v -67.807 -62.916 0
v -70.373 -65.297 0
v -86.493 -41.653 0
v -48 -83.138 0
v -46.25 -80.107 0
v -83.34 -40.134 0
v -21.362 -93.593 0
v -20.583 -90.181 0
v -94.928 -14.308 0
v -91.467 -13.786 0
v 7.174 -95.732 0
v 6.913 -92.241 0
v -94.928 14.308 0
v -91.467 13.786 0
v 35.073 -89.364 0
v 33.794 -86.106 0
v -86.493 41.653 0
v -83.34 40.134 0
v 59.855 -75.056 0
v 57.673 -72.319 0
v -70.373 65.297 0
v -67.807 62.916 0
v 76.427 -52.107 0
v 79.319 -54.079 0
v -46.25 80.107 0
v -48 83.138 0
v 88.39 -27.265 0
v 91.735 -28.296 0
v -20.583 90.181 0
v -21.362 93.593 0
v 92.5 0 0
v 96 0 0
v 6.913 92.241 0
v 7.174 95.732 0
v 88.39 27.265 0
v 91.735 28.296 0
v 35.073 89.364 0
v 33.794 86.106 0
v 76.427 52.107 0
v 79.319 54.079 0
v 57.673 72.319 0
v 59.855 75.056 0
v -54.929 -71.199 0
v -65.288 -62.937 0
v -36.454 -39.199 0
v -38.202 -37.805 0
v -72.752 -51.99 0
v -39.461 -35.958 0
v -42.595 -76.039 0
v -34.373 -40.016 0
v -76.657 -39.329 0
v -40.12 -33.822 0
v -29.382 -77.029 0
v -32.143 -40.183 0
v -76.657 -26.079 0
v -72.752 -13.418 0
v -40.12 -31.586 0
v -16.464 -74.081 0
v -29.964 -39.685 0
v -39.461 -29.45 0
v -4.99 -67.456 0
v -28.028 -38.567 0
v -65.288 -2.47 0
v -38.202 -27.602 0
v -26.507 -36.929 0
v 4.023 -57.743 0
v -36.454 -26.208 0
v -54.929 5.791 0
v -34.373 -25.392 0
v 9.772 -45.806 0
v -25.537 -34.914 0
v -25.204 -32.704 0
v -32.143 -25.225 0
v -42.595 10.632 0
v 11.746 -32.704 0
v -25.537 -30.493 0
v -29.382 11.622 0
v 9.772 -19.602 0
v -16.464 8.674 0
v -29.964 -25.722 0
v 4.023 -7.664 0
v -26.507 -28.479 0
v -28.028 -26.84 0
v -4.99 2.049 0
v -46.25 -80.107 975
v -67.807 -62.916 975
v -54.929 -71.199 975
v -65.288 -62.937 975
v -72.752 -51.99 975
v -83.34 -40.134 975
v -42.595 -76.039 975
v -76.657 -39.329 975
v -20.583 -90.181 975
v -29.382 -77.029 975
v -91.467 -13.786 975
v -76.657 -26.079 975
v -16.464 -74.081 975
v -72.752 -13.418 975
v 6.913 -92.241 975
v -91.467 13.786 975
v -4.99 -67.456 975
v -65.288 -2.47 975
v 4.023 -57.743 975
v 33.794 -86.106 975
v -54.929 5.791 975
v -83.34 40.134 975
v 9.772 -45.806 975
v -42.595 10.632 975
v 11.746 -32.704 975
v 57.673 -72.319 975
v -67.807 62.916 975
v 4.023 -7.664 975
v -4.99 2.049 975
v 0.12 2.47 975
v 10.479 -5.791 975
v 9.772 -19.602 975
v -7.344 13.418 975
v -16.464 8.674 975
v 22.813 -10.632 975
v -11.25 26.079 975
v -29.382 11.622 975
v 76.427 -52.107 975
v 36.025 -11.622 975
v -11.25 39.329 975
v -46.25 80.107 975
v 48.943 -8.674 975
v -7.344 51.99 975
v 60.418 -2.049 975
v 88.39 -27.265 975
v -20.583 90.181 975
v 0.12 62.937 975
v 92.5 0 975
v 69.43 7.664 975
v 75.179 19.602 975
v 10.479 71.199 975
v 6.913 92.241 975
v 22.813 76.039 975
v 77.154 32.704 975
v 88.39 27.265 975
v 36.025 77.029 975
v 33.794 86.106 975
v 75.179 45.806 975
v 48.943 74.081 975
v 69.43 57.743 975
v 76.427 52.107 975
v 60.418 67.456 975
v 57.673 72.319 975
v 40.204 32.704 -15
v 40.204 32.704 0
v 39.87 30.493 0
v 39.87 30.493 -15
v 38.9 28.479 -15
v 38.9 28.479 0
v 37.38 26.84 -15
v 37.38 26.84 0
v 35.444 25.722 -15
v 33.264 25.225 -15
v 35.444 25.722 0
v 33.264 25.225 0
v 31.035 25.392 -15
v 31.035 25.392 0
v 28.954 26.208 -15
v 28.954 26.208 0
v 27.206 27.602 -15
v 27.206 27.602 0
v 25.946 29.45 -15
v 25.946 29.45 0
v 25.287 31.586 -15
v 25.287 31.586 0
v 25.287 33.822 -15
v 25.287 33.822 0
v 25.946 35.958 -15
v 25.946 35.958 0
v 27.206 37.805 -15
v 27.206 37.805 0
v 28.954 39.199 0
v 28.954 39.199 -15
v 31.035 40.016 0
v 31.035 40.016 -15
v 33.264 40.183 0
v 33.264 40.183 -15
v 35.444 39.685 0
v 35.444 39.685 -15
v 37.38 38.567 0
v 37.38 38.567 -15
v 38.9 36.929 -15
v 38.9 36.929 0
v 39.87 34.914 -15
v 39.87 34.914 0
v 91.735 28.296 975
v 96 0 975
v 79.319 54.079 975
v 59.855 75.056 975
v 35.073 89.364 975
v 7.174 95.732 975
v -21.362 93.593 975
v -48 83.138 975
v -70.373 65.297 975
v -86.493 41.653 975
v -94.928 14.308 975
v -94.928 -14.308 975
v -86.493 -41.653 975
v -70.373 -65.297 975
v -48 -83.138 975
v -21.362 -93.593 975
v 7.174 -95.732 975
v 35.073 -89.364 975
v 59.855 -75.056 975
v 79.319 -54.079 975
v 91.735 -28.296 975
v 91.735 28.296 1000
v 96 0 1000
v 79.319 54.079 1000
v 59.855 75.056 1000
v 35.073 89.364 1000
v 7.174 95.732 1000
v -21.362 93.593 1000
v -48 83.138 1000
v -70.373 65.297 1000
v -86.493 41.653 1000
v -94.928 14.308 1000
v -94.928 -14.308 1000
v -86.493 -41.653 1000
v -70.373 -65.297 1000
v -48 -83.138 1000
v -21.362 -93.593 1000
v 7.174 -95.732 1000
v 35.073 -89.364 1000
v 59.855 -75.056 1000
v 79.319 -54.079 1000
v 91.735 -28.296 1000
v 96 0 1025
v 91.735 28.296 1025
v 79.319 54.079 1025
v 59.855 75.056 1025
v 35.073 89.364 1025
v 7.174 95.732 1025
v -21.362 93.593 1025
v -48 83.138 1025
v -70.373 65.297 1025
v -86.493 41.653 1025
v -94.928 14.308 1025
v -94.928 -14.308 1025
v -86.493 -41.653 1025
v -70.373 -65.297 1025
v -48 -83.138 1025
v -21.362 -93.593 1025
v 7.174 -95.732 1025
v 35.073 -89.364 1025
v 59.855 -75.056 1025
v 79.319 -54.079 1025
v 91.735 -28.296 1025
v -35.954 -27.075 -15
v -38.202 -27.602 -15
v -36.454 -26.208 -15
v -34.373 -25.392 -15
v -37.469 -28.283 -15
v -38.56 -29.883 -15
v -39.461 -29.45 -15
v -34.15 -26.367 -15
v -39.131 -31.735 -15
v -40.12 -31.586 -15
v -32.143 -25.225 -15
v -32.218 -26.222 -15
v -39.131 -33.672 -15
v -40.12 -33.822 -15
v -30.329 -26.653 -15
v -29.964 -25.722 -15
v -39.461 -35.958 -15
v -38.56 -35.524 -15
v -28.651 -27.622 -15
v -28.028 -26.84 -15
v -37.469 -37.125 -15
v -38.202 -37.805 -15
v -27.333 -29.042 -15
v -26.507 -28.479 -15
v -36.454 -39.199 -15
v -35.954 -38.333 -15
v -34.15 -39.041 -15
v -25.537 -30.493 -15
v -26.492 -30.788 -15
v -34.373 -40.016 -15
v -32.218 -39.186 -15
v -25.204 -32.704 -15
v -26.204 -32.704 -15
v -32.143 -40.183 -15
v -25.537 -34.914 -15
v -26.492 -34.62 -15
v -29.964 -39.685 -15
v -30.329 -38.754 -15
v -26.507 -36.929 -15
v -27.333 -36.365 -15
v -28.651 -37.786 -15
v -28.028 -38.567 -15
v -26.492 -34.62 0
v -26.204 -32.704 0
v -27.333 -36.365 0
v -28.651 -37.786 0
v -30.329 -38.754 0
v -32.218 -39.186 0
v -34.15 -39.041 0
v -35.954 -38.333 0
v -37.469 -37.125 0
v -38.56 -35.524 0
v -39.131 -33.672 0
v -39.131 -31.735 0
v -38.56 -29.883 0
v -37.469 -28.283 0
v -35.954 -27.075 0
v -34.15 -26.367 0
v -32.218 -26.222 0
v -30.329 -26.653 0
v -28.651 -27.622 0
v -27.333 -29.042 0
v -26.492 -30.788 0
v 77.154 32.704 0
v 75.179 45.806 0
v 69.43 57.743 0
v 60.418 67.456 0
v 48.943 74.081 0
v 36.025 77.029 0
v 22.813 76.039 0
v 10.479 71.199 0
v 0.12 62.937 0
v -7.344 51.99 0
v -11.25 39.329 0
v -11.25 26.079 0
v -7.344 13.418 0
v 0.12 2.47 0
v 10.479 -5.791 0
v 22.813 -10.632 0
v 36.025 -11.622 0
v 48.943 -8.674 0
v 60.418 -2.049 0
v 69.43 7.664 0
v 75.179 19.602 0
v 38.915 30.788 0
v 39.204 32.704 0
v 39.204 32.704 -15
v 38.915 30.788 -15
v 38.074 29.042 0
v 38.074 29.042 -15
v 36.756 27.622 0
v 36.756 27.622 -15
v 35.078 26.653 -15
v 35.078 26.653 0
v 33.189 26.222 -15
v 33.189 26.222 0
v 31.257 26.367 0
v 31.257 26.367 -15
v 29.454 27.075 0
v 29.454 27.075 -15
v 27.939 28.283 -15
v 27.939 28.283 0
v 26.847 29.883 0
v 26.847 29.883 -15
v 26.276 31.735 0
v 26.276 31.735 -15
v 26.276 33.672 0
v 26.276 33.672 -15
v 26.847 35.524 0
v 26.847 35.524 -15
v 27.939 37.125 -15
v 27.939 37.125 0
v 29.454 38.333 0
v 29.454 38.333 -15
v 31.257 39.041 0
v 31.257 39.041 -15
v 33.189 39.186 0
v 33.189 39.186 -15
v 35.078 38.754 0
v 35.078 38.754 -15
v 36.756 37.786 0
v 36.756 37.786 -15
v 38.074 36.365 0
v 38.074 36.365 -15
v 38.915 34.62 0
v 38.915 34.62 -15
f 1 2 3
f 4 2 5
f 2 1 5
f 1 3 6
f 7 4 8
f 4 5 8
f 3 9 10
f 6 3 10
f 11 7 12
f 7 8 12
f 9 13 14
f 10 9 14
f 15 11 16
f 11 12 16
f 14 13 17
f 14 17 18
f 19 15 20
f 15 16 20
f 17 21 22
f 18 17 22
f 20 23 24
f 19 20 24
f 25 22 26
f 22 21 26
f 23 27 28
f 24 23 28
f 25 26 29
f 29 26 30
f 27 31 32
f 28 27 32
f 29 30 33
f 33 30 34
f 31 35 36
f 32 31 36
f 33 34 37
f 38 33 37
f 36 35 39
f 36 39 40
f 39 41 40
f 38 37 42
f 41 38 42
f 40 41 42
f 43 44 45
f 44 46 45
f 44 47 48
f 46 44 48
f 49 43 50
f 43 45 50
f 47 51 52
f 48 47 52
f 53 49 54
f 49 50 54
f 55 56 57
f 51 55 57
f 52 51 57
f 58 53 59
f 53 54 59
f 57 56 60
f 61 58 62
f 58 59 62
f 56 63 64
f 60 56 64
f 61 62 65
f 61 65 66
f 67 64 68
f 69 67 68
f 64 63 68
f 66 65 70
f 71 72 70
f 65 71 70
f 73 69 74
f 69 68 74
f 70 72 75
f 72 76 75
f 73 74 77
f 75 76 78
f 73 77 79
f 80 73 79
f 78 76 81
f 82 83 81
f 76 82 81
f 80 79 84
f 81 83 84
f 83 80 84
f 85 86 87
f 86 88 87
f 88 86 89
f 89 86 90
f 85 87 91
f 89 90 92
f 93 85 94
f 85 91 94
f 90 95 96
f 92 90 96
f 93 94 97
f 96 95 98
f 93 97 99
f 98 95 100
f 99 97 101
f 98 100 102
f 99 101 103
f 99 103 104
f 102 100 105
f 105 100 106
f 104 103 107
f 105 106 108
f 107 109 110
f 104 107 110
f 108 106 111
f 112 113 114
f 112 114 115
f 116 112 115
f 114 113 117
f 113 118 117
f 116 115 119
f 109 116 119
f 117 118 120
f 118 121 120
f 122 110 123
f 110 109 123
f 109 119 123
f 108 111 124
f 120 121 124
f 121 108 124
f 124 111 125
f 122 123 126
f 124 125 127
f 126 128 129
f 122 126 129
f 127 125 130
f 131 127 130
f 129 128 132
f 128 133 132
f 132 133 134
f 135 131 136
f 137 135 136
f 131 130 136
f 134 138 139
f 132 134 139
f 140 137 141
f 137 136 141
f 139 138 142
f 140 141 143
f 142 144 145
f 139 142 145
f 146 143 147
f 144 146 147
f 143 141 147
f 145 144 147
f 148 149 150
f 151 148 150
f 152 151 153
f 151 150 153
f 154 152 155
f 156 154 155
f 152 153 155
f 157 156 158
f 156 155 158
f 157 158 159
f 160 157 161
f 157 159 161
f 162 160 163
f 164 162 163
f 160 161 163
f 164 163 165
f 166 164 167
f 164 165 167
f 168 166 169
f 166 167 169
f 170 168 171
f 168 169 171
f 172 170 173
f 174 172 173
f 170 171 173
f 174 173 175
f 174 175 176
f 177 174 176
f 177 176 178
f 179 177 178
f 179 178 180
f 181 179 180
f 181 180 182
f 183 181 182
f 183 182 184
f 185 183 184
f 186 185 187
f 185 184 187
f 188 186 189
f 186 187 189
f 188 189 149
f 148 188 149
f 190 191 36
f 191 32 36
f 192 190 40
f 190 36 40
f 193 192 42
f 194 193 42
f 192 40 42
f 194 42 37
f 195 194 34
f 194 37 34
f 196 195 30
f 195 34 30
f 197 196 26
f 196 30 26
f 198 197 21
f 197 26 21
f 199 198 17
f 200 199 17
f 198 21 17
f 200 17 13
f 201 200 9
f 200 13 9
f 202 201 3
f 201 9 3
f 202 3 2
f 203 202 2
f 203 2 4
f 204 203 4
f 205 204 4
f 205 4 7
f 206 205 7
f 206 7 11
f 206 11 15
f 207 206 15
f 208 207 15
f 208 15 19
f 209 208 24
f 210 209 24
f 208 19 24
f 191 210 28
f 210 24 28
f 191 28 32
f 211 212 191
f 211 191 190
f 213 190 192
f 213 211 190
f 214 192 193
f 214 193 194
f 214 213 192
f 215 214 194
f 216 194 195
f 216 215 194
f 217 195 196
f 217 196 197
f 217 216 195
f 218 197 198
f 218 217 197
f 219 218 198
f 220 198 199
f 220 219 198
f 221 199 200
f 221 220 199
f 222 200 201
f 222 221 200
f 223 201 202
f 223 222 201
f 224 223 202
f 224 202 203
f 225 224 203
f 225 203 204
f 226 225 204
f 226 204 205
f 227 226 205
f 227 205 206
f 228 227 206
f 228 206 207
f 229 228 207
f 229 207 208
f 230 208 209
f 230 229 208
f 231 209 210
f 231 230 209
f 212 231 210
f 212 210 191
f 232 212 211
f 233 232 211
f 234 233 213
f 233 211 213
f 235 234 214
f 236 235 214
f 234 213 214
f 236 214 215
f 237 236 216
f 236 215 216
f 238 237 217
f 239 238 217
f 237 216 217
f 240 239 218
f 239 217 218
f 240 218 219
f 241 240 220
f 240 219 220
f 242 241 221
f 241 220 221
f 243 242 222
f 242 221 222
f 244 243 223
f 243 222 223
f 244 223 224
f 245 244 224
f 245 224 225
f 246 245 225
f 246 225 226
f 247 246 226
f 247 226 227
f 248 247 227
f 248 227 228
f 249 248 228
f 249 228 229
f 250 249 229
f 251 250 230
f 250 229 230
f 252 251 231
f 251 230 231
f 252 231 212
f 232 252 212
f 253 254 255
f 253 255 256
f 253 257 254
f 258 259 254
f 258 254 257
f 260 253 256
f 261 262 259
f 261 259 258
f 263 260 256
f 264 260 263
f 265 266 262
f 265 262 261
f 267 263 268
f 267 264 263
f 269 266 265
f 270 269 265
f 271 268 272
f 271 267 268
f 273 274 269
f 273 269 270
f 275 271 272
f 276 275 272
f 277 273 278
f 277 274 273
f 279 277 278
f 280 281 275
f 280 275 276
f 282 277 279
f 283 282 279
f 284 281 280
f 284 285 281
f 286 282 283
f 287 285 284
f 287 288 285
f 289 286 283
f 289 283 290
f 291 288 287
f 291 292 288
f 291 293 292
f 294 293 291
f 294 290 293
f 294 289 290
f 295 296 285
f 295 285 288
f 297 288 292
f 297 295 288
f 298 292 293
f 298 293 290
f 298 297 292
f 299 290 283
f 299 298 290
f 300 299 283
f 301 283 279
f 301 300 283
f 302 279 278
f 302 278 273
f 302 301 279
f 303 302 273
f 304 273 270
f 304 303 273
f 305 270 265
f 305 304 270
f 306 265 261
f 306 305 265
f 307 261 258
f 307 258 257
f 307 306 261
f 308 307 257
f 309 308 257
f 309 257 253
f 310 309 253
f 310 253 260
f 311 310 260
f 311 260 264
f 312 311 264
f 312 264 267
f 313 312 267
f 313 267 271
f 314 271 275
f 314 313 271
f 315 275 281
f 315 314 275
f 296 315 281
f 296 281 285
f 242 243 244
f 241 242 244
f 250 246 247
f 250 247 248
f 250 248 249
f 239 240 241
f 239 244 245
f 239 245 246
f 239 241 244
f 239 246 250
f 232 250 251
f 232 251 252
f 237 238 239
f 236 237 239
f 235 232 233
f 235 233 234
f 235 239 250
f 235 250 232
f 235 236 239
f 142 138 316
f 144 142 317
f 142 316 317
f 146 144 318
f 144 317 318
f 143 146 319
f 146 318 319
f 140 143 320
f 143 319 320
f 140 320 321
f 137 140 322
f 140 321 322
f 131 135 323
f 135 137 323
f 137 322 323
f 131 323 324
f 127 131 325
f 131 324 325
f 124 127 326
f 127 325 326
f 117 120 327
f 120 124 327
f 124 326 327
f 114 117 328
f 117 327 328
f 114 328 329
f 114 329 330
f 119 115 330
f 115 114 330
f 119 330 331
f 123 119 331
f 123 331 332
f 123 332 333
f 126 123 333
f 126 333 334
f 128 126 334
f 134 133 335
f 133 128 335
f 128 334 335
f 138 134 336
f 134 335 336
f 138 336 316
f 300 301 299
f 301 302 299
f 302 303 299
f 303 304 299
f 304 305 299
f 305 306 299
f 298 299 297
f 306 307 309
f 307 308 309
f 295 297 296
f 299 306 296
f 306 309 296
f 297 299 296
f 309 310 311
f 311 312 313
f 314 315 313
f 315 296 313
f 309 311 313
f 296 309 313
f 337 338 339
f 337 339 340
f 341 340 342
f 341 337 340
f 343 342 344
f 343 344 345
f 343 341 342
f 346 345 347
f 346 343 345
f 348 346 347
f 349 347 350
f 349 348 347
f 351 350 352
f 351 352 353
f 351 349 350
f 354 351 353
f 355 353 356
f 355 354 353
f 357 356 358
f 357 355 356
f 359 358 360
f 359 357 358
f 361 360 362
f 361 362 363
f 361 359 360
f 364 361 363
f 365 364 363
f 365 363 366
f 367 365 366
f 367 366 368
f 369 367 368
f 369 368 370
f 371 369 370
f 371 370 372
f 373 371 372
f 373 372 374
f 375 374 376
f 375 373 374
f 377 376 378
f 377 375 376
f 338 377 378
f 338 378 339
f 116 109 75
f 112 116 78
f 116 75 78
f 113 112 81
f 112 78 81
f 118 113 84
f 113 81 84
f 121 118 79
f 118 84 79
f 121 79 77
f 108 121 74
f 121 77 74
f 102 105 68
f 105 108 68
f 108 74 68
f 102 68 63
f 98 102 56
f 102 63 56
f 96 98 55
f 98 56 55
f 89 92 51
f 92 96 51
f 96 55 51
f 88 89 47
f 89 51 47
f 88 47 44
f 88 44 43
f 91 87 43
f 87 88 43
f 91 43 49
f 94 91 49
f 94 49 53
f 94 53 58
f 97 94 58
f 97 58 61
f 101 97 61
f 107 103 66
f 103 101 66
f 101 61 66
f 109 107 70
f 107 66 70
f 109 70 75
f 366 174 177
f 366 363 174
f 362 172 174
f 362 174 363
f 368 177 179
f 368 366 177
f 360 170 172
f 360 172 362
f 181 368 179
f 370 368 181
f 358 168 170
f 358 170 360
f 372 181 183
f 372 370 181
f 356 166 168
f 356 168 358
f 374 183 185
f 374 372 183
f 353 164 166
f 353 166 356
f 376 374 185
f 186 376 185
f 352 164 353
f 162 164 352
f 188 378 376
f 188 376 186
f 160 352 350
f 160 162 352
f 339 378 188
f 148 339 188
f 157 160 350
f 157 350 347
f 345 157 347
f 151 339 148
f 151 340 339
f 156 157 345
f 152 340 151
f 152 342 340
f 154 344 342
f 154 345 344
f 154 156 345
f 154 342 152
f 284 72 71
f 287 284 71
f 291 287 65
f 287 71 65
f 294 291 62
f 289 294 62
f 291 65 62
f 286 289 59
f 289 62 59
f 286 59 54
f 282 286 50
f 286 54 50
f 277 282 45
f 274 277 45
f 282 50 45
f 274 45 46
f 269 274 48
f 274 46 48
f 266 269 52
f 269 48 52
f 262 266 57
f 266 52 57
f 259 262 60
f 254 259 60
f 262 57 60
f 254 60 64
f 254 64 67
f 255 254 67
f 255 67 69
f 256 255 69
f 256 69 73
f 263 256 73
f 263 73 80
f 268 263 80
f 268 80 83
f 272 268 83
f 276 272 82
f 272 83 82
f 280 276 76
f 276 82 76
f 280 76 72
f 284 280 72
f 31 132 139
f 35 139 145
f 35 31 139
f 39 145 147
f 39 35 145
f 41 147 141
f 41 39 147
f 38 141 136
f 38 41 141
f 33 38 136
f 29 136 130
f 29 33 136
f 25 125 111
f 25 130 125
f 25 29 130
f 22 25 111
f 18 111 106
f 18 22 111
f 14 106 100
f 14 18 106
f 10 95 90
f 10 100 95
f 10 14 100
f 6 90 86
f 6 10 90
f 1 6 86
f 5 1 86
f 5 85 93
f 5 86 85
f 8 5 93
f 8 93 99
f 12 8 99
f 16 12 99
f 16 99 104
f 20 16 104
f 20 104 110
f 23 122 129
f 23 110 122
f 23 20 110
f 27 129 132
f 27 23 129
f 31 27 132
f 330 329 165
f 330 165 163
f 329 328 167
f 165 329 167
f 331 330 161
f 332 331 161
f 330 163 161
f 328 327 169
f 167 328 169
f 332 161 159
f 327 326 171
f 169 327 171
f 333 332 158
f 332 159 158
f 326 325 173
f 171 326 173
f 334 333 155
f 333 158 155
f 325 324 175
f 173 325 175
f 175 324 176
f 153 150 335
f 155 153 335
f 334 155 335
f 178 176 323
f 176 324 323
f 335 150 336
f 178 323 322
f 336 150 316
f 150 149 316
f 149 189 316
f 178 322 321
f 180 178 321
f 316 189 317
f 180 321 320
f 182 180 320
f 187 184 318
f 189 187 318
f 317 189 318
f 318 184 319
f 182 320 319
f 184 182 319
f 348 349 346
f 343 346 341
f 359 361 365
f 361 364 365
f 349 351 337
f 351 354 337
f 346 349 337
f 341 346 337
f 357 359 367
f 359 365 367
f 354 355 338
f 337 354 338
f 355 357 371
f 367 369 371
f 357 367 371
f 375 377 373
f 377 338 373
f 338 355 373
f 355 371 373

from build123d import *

# Parameters (mm, degrees)
F0_R          = 44.45
F1_DEPTH      = 1000
F0_R_2        = 96
F0_R_3        = 92.5
F2_R          = 7.5
F2_R_2        = 6.5
F3_DEPTH      = 15
F4_R          = 96
F5_DEPTH      = 25
F5_DEPTH_BACK = 25
F6_R          = 7.5
F6_R_2        = 6.5
F7_DEPTH      = 15


with BuildPart() as f1:
    # F0 (on Top) → F1 (new body)
    with BuildSketch(Plane.XY):
        with Locations((-32.7036886299, -32.7036886299)):
            Circle(F0_R)
    extrude(amount=F1_DEPTH)



with BuildPart() as f1b:
    # F0 (on Top) → F1, piece 2 (new body)
    with BuildSketch(Plane.XY):
        with Locations((32.7036886299, 32.7036886299)):
            Circle(F0_R)
    extrude(amount=F1_DEPTH)

    # F2 (on face) → F3 (join)
    with BuildSketch(Plane(origin=(0, 0, 0), x_dir=(1, 0, 0), z_dir=(0, 0, -1))):
        with Locations((32.7036886299, -32.7036886299)):
            Circle(F2_R)
        with Locations((32.7036886299, -32.7036886299)):
            Circle(F2_R_2, mode=Mode.SUBTRACT)
    extrude(amount=F3_DEPTH)


with BuildPart() as f1c:
    # F0 (on Top) → F1, piece 3 (new body)
    with BuildSketch(Plane.XY):
        Circle(F0_R_2)
        Circle(F0_R_3, mode=Mode.SUBTRACT)
    extrude(amount=F1_DEPTH)


with BuildPart() as f1_1:
    add(f1.part)

    add(f1b.part)  # F5 merges F1b

    add(f1c.part)  # F5 merges F1c
    # F4 (on face) → F5 (join, two sides)
    with BuildSketch(Plane.XY.offset(1000)) as f5_sk:
        Circle(F4_R)
    extrude(amount=F5_DEPTH)
    extrude(f5_sk.sketch, amount=-F5_DEPTH_BACK)

    # F6 (on face) → F7 (join)
    with BuildSketch(Plane(origin=(0, 0, 0), x_dir=(1, 0, 0), z_dir=(0, 0, -1))):
        with Locations((-32.7036886299, 32.7036886299)):
            Circle(F6_R)
        with Locations((-32.7036886299, 32.7036886299)):
            Circle(F6_R_2, mode=Mode.SUBTRACT)
    extrude(amount=F7_DEPTH)


solid = f1_1.part
